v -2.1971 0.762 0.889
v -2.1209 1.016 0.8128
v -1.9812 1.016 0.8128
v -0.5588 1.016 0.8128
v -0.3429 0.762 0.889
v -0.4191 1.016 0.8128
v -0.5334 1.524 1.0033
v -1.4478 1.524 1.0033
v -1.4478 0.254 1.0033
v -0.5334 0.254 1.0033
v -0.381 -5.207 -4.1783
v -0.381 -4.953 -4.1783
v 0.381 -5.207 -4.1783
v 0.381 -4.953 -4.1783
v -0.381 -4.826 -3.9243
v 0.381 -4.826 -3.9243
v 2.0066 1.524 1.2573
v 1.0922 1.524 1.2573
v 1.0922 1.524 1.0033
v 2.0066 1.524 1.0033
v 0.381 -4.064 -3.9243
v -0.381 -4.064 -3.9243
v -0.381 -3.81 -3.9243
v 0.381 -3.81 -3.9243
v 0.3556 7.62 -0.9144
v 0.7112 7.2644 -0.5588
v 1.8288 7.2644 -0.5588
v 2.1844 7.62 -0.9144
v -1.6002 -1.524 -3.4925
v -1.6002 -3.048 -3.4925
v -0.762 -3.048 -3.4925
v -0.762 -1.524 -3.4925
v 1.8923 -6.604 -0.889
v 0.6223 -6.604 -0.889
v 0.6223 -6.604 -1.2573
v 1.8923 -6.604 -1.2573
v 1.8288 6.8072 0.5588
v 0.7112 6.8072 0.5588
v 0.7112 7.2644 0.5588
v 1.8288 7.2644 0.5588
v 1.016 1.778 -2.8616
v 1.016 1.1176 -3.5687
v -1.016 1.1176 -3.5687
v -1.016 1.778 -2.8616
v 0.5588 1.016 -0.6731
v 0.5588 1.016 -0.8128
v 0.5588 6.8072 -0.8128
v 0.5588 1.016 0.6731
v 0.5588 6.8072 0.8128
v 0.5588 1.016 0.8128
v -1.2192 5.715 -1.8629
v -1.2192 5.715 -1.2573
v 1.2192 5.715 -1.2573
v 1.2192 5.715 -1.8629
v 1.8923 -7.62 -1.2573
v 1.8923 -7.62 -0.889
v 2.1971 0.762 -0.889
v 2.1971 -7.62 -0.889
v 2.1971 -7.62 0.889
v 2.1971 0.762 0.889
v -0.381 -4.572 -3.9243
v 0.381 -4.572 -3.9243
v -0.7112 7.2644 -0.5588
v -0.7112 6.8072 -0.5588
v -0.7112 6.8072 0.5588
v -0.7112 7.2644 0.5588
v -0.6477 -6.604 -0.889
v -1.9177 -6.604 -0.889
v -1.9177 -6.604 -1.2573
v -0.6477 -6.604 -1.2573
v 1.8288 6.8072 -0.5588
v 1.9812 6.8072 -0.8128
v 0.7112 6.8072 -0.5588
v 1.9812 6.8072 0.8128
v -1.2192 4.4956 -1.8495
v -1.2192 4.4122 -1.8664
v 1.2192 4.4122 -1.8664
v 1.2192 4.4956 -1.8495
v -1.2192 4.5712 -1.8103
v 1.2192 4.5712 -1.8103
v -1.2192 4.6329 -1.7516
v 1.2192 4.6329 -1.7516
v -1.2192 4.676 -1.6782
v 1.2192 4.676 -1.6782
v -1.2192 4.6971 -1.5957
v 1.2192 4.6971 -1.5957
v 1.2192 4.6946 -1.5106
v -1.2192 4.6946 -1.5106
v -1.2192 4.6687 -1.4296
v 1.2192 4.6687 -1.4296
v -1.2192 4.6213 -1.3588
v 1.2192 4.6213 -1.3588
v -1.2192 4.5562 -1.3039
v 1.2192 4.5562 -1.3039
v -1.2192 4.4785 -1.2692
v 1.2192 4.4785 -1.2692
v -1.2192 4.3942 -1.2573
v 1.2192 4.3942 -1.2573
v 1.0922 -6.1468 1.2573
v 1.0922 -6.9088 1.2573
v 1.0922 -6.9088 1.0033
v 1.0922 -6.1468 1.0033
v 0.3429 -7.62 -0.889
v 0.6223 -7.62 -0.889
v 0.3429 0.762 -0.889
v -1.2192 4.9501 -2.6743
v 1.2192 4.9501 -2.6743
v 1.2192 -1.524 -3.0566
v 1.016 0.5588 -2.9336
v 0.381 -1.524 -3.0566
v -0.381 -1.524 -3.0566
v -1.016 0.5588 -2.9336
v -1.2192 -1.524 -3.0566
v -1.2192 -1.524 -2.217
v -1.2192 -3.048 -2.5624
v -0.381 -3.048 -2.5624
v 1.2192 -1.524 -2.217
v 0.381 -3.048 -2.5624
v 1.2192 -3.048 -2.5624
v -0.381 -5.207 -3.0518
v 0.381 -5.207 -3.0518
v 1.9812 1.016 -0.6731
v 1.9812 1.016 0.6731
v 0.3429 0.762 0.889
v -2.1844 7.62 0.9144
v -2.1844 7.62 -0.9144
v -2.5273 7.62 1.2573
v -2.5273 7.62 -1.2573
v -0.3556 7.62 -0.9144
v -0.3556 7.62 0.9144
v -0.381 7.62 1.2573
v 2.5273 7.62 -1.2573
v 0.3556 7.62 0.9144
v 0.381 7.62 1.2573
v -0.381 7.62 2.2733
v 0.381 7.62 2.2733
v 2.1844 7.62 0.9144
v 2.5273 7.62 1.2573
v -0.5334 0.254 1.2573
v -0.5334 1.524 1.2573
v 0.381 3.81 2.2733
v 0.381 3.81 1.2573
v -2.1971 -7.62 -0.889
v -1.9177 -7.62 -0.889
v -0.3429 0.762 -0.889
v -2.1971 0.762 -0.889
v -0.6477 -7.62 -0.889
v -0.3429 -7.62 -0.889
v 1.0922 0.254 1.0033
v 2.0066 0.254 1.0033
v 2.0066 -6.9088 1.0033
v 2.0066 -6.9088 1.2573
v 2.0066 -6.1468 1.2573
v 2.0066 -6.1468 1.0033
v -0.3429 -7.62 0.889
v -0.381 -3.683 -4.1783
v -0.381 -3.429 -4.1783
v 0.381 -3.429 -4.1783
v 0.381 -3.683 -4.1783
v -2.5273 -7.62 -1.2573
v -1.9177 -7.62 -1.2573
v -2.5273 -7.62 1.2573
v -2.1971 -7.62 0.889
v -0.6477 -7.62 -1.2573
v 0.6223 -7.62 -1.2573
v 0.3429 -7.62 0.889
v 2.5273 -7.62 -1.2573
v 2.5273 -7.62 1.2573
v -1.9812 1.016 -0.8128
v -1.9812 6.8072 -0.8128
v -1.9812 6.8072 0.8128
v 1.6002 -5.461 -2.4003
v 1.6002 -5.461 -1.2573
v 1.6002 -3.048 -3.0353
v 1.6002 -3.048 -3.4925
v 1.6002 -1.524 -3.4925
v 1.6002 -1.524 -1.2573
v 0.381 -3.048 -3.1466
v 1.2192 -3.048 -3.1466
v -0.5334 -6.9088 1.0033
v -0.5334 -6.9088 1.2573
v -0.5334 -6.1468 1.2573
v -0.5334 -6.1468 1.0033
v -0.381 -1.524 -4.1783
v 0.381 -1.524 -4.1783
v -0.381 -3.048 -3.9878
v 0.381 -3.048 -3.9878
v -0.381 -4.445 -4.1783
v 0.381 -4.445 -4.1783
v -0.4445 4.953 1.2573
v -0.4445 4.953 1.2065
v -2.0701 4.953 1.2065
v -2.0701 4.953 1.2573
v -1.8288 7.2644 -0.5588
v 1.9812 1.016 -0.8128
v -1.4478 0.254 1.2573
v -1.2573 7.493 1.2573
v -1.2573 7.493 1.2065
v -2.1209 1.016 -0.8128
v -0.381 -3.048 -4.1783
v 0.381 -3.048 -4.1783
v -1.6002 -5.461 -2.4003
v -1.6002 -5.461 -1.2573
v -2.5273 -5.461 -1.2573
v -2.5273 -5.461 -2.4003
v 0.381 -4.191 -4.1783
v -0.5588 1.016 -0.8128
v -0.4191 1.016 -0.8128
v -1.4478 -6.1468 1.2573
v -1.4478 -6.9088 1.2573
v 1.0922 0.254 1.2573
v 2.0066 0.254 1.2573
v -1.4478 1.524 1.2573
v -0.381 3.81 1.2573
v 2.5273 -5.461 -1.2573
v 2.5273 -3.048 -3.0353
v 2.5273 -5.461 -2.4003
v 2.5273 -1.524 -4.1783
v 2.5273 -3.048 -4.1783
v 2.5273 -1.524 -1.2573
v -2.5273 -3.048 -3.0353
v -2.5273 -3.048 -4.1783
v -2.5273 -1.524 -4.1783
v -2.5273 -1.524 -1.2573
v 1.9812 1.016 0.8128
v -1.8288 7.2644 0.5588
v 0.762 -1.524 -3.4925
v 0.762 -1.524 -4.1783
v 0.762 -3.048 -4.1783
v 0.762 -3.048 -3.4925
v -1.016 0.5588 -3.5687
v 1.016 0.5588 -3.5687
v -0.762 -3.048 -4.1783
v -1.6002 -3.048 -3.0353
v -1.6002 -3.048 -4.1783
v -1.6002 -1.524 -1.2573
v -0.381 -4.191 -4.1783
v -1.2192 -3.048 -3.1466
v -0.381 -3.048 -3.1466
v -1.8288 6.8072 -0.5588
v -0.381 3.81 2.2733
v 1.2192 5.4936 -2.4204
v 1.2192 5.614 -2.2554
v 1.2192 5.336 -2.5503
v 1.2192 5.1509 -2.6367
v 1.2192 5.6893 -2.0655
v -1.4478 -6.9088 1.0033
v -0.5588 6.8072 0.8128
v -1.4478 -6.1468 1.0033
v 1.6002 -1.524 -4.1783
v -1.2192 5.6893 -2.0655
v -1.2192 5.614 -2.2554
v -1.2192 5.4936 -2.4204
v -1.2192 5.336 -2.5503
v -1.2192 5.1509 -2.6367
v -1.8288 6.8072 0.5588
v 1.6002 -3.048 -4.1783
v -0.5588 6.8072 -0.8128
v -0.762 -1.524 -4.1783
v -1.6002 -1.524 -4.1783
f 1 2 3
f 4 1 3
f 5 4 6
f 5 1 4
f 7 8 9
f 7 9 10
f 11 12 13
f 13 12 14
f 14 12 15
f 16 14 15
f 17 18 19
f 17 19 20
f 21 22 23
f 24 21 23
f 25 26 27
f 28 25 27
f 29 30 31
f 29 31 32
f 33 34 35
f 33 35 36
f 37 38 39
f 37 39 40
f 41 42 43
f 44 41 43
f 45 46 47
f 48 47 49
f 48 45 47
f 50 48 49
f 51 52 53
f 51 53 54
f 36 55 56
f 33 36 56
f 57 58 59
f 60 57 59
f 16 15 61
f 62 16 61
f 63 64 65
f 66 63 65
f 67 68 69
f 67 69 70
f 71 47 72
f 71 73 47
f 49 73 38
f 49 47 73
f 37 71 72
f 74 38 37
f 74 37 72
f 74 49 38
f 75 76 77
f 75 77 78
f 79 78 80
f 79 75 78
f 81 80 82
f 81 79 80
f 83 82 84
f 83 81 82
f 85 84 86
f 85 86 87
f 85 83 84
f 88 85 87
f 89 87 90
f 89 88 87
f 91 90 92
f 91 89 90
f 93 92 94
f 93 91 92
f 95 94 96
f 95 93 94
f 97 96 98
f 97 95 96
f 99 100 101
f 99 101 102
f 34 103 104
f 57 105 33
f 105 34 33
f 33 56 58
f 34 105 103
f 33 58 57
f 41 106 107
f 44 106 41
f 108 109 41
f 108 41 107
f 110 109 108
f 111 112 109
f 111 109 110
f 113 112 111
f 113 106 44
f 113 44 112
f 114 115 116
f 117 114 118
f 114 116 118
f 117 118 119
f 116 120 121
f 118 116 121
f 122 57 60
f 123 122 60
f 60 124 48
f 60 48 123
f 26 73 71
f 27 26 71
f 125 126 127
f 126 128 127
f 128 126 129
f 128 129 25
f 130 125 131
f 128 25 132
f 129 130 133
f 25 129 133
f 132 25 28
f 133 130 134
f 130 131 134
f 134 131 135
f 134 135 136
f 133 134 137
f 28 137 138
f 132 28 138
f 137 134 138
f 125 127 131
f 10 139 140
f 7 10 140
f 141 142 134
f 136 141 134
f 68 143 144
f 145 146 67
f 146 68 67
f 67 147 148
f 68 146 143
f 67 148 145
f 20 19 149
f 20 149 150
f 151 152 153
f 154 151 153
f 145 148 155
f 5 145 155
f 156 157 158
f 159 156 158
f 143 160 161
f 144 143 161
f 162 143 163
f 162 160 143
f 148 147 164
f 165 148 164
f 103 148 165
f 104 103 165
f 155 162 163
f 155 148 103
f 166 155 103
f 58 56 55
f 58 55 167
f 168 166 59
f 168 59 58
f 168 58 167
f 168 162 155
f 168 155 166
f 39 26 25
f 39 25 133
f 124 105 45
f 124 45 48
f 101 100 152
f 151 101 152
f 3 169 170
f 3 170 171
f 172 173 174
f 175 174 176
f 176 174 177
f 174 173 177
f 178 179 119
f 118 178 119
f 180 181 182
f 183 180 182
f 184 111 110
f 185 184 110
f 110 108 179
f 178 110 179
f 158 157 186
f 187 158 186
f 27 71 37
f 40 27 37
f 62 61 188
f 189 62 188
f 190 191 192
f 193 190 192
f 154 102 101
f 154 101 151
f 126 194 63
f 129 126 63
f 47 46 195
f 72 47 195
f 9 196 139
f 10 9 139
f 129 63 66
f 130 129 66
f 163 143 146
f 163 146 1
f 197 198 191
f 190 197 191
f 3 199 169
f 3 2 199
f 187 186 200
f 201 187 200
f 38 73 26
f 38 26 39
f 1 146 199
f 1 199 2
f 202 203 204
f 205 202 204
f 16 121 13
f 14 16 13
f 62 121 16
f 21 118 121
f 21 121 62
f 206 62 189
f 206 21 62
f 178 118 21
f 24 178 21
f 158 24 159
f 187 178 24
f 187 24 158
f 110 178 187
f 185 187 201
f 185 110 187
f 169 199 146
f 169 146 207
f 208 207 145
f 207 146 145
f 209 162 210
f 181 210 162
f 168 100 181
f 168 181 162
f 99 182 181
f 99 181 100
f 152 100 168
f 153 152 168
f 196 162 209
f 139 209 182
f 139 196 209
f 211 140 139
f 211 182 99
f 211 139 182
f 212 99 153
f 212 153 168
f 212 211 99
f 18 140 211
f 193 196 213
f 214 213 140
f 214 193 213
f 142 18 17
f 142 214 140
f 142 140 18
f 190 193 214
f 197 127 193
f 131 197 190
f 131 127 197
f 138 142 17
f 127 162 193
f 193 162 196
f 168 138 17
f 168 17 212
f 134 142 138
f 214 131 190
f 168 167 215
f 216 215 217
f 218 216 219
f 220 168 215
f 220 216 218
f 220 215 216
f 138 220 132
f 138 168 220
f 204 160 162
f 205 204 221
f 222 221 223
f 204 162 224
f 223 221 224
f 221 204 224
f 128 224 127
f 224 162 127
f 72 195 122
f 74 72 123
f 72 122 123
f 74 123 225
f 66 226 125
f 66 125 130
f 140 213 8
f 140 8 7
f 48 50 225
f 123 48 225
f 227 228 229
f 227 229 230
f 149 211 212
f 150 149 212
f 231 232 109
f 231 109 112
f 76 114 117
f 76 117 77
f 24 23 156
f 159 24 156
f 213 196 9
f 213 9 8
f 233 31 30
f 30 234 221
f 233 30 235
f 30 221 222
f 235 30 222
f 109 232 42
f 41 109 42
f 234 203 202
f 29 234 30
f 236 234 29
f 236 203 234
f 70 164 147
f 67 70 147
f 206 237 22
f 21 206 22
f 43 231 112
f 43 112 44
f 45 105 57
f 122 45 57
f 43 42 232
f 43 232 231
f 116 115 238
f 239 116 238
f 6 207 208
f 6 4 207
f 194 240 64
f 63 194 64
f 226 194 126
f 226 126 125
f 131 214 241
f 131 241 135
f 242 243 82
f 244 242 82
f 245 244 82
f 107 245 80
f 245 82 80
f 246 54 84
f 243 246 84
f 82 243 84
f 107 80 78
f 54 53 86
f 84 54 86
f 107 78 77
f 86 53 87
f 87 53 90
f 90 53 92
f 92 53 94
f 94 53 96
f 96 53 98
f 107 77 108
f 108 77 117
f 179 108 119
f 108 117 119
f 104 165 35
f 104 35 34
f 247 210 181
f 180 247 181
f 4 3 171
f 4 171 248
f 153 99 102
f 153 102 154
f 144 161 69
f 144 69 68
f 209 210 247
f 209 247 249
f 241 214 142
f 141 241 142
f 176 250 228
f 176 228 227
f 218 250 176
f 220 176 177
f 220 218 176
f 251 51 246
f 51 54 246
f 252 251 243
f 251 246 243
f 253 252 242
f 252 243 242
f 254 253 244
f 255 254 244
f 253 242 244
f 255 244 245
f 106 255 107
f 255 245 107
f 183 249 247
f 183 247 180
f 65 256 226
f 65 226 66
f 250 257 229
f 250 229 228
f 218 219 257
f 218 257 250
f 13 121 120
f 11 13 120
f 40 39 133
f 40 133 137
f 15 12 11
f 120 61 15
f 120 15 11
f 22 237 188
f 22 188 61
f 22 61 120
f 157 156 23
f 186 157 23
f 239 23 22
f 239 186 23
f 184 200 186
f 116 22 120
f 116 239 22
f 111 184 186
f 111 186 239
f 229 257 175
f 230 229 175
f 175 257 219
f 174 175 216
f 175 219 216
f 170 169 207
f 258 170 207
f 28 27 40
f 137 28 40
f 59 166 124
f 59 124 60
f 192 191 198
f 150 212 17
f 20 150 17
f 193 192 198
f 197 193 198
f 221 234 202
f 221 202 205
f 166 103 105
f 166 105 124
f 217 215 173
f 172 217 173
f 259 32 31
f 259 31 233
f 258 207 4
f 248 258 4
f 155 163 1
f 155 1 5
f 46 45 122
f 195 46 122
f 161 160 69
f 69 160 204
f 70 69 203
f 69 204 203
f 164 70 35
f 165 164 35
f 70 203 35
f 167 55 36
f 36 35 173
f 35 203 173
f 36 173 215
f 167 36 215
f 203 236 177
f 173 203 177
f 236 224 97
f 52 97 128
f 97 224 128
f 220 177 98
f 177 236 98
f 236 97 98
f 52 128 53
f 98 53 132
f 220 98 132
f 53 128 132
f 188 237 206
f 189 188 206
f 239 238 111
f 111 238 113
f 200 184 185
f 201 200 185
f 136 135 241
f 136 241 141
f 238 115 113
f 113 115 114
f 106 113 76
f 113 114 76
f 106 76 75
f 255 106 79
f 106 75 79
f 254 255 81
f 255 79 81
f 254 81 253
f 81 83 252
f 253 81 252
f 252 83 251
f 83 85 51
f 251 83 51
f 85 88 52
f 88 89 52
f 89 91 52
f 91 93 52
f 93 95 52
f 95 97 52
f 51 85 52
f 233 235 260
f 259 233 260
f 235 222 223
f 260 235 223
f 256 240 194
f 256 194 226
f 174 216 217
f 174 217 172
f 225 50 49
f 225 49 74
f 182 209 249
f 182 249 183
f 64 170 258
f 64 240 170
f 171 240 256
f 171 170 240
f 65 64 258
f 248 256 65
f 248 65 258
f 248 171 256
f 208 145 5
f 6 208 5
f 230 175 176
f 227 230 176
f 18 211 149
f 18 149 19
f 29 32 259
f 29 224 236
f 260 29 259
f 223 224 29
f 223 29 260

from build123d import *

# Parameters (mm, degrees)
SKETCH1_W            = 5.0546
SKETCH1_H            = 15.24
BOSS_EXTRUDE1_DEPTH  = 2.514600001
CUT_EXTRUDE1_REACH   = 2.051
BOSS_EXTRUDE2_DEPTH  = 2.4384
CHAMFER1_SIZE        = 3.689417857
CHAMFER1_SIZE2       = 0.617363155
BOSS_EXTRUDE3_DEPTH  = 1.121675474
DRAFT1_ANGLE         = 3.38
FILLET1_R            = 0.8128
CUT_EXTRUDE2_DEPTH   = 0.8382
CUT_EXTRUDE3_DEPTH   = 0.8382
BOSS_EXTRUDE4_REACH  = 6.826
SKETCH7_W            = 2.032
SKETCH7_H            = 0.5588
DRAFT2_ANGLE         = 43.044366599
SKETCH8_W            = 0.9271
SKETCH8_H            = 3.937
BOSS_EXTRUDE5_DEPTH  = 1.778
SKETCH9_W            = 0.9271
SKETCH9_H            = 3.937
BOSS_EXTRUDE6_DEPTH  = 1.778
SKETCH10_W           = 0.9271
SKETCH10_H           = 1.524
BOSS_EXTRUDE7_DEPTH  = 1.143
SKETCH11_W           = 0.9271
SKETCH11_H           = 1.524
BOSS_EXTRUDE8_DEPTH  = 1.143
SKETCH12_W           = 0.6858
SKETCH12_H           = 1.524
BOSS_EXTRUDE9_DEPTH  = 0.8382
SKETCH13_W           = 0.6858
SKETCH13_H           = 1.524
BOSS_EXTRUDE10_DEPTH = 0.8382
DRAFT3_ANGLE         = 14.743562836
DRAFT4_ANGLE         = 14.743562836
CUT_EXTRUDE4_DEPTH   = 0.762
CUT_EXTRUDE5_DEPTH   = 0.762
CUT_EXTRUDE6_DEPTH   = 0.762
SKETCH17_W           = 0.762
SKETCH17_H           = 3.81
BOSS_EXTRUDE11_DEPTH = 1.016
SKETCH18_W           = 0.9144
SKETCH18_H           = 1.27
CUT_EXTRUDE7_DEPTH   = 0.254
SKETCH19_W           = 0.9144
SKETCH19_H           = 0.762
CUT_EXTRUDE8_DEPTH   = 0.254
SKETCH20_W           = 0.9144
SKETCH20_H           = 1.27
CUT_EXTRUDE9_DEPTH   = 0.254
SKETCH21_W           = 0.9144
SKETCH21_H           = 0.762
CUT_EXTRUDE10_DEPTH  = 0.254
SKETCH22_W           = 1.8542
SKETCH22_H           = 1.778
CUT_EXTRUDE11_DEPTH  = 8.636
SKETCH23_W           = 1.8542
SKETCH23_H           = 1.778
CUT_EXTRUDE12_DEPTH  = 8.636
CHAMFER2_SIZE        = 0.0762
CHAMFER2_SIZE2       = 0.254
CHAMFER3_SIZE        = 0.2159
CHAMFER3_SIZE2       = 0.254
SKETCH24_W           = 1.27
SKETCH24_H           = 0.3683
CUT_EXTRUDE13_DEPTH  = 1.016
SKETCH25_W           = 1.27
SKETCH25_H           = 0.3683
CUT_EXTRUDE14_DEPTH  = 1.016
SKETCH26_W           = 1.4224
SKETCH26_H           = 1.6256
CUT_EXTRUDE15_DEPTH  = 5.7912
SKETCH27_W           = 1.4224
SKETCH27_H           = 1.6256
CUT_EXTRUDE16_DEPTH  = 5.7912
SKETCH28_W           = 1.1176
SKETCH28_H           = 1.1176
CUT_EXTRUDE17_DEPTH  = 1.8128
SKETCH29_W           = 1.1176
SKETCH29_H           = 1.1176
CUT_EXTRUDE18_DEPTH  = 1.8128
CHAMFER4_SIZE        = 0.3556
CHAMFER5_SIZE        = 0.3556


with BuildPart() as part:
    # Sketch1 → Boss-Extrude1 (new body)
    with BuildSketch(Plane.XY.offset(1.2573)):
        Rectangle(SKETCH1_W, SKETCH1_H)
    extrude(amount=-BOSS_EXTRUDE1_DEPTH)

    # Sketch2 → Cut-Extrude1 (cut, up to next)
    with BuildSketch(Plane(origin=(0, 0, 1.2065), x_dir=(-1, 0, 0), z_dir=(0, 0, -1)), mode=Mode.PRIVATE) as cut_extrude1_sk1:
        Polygon((0.4445, 4.953), (2.0701, 4.953), (1.2573, 7.493), align=None)
    cut_extrude1_tool1 = extrude(cut_extrude1_sk1.sketch, amount=-CUT_EXTRUDE1_REACH, mode=Mode.PRIVATE) & part.part
    add(cut_extrude1_tool1.solids().sort_by_distance((-1.2573, 5.799667, 1.2065))[0], mode=Mode.SUBTRACT)

    # Sketch3 → Boss-Extrude2 (add)
    with BuildSketch(Plane(origin=(-1.2192, 0, 0), x_dir=(0, -1, 0), z_dir=(-1, 0, 0))):
        with BuildLine():
            Line((5.207, -2.434484307), (-4.412170374, -1.866369791))
            ThreePointArc((-4.412170374, -1.866369791), (-4.698867419, -1.553110903), (-4.394200001, -1.2573))
            Line((-4.394200001, -1.2573), (-5.715, -1.2573))
            Line((-5.715, -1.2573), (-5.715, -3.056624526))
            Line((-5.715, -3.056624526), (3.048, -3.056624526))
            Line((3.048, -3.056624526), (3.429, -3.056624526))
            Line((3.429, -3.056624526), (3.683, -3.056624526))
            Line((3.683, -3.056624526), (4.191, -3.056624526))
            Line((4.191, -3.056624526), (4.445, -3.056624526))
            Line((4.445, -3.056624526), (4.953, -3.056624526))
            Line((4.953, -3.056624526), (5.207, -3.056624526))
            Line((5.207, -3.056624526), (5.207, -2.434484307))
        make_face()
    extrude(amount=-BOSS_EXTRUDE2_DEPTH)

    # Chamfer1
    chamfer1_edges = [part.edges().sort_by_distance(p)[0] for p in [
        (0, -5.207, -2.434484307),
    ]]
    chamfer1_side = [part.faces().sort_by_distance(p)[0] for p in [
        (0, -0.397414813, -2.150427049),
    ]]
    chamfer(chamfer1_edges, length=CHAMFER1_SIZE, length2=CHAMFER1_SIZE2, reference=chamfer1_side[0])

    # Sketch4 → Boss-Extrude3 (add)
    with BuildSketch(Plane(origin=(0, 0, -3.056624526), x_dir=(-1, 0, 0), z_dir=(0, 0, -1))):
        Polygon((1.2192, -3.683000003), (1.2192, -4.191000003), (1.2192, -4.445000003), (1.2192, -4.953000003), (1.2192, -5.207000003), (0.381, -5.207000003), (-0.381, -5.207000003), (-1.2192, -5.207000003), (-1.2192, -4.953000003), (-1.2192, -4.445000003), (-1.2192, -4.191000003), (-1.2192, -3.683000003), (-1.2192, -3.429000003), (-1.2192, -3.048000003), (-1.2192, -1.524000003), (-0.381, -1.524000003), (0.381, -1.524000003), (1.2192, -1.524000003), (1.2192, -3.048000003), (1.2192, -3.429000003), align=None)
    extrude(amount=BOSS_EXTRUDE3_DEPTH)

    # Draft1
    draft1_faces = [part.faces().sort_by_distance(p)[0] for p in [
        (0, 2.095499999, -3.056624526),
    ]]
    draft(draft1_faces, Plane(origin=(1.2192, -1.524000003, -4.1783), x_dir=(1, 0, 0), z_dir=(0, 1, 0)), DRAFT1_ANGLE)

    # Fillet1
    fillet1_edges = [part.edges().sort_by_distance(p)[0] for p in [
        (0, 5.715, -2.629084434),
    ]]
    fillet(fillet1_edges, radius=FILLET1_R)

    # Sketch5 → Cut-Extrude2 (cut)
    with BuildSketch(Plane.ZY.offset(1.2192)):
        Polygon((-4.1783, -1.523999999), (-4.1783, -3.048), (-4.1783, -3.429), (-4.1783, -3.683), (-4.1783, -4.191), (-4.1783, -4.445), (-4.1783, -4.953), (-4.1783, -5.207), (-3.051847462, -5.207), (-2.562432966, -3.048), (-3.146632966, -3.048), (-3.056624525, -1.523999999), align=None)
    extrude(amount=-CUT_EXTRUDE2_DEPTH, mode=Mode.SUBTRACT)

    # Sketch6 → Cut-Extrude3 (cut)
    with BuildSketch(Plane(origin=(1.2192, 0, 0), x_dir=(0, 0, -1), z_dir=(1, 0, 0))):
        Polygon((4.1783, -3.429), (4.1783, -3.048), (4.1783, -1.524000001), (3.056624525, -1.524000001), (3.146632966, -3.048), (2.562432966, -3.048), (3.051847462, -5.207), (4.1783, -5.207), (4.1783, -4.953), (4.1783, -4.445), (4.1783, -4.191), (4.1783, -3.683), align=None)
    extrude(amount=-CUT_EXTRUDE3_DEPTH, mode=Mode.SUBTRACT)

    # Sketch7 → Boss-Extrude4 (add, up to next)
    with BuildSketch(Plane(origin=(0, 0, -3.5687), x_dir=(-1, 0, 0), z_dir=(0, 0, -1)), mode=Mode.PRIVATE) as boss_extrude4_sk1:
        with Locations((0, 0.8382)):
            Rectangle(SKETCH7_W, SKETCH7_H)
    boss_extrude4_tool1 = extrude(boss_extrude4_sk1.sketch, amount=-BOSS_EXTRUDE4_REACH, mode=Mode.PRIVATE) - part.part
    add(boss_extrude4_tool1.solids().sort_by_distance((0, 0.8382, -3.5687))[0])

    # Draft2
    draft2_faces = [part.faces().sort_by_distance(p)[0] for p in [
        (0, 1.1176, -3.234654948),
    ]]
    draft(draft2_faces, Plane(origin=(0, 0, -3.5687), x_dir=(-1, 0, 0), z_dir=(0, 0, -1)), DRAFT2_ANGLE)

    # Sketch8 → Boss-Extrude5 (add)
    with BuildSketch(Plane(origin=(0, 0, -1.257300001), x_dir=(-1, 0, 0), z_dir=(0, 0, -1))):
        with Locations((-2.06375, -3.4925)):
            Rectangle(SKETCH8_W, SKETCH8_H)
    extrude(amount=BOSS_EXTRUDE5_DEPTH)

    # Sketch9 → Boss-Extrude6 (add)
    with BuildSketch(Plane(origin=(0, 0, -1.257300001), x_dir=(-1, 0, 0), z_dir=(0, 0, -1))):
        with Locations((2.06375, -3.4925)):
            Rectangle(SKETCH9_W, SKETCH9_H)
    extrude(amount=BOSS_EXTRUDE6_DEPTH)

    # Sketch10 → Boss-Extrude7 (add)
    with BuildSketch(Plane(origin=(0, 0, -3.035300001), x_dir=(-1, 0, 0), z_dir=(0, 0, -1))):
        with Locations((2.06375, -2.286)):
            Rectangle(SKETCH10_W, SKETCH10_H)
    extrude(amount=BOSS_EXTRUDE7_DEPTH)

    # Sketch11 → Boss-Extrude8 (add)
    with BuildSketch(Plane(origin=(0, 0, -3.035300001), x_dir=(-1, 0, 0), z_dir=(0, 0, -1))):
        with Locations((-2.06375, -2.286)):
            Rectangle(SKETCH11_W, SKETCH11_H)
    extrude(amount=BOSS_EXTRUDE8_DEPTH)

    # Sketch12 → Boss-Extrude9 (add)
    with BuildSketch(Plane.ZY.offset(-1.6002)):
        with Locations((-3.8354, -2.286)):
            Rectangle(SKETCH12_W, SKETCH12_H)
    extrude(amount=BOSS_EXTRUDE9_DEPTH)

    # Sketch13 → Boss-Extrude10 (add)
    with BuildSketch(Plane(origin=(-1.6002, 0, 0), x_dir=(0, 0, -1), z_dir=(1, 0, 0))):
        with Locations((3.8354, -2.286)):
            Rectangle(SKETCH13_W, SKETCH13_H)
    extrude(amount=BOSS_EXTRUDE10_DEPTH)

    # Draft3
    draft3_faces = [part.faces().sort_by_distance(p)[0] for p in [
        (-2.06375, -4.2545, -3.035300001),
    ]]
    draft(draft3_faces, Plane(origin=(-2.5273, -3.048, -4.178300001), x_dir=(-1, 0, 0), z_dir=(0, -1, 0)), DRAFT3_ANGLE)

    # Draft4
    draft4_faces = [part.faces().sort_by_distance(p)[0] for p in [
        (2.06375, -4.2545, -3.035300001),
    ]]
    draft(draft4_faces, Plane(origin=(1.6002, -3.048, -4.178300001), x_dir=(0, 0, -1), z_dir=(0, -1, 0)), DRAFT4_ANGLE)

    # Sketch14 → Cut-Extrude4 (cut)
    with BuildSketch(Plane.ZY.offset(0.381)):
        Polygon((-4.1783, -3.429), (-3.9878, -3.048), (-4.1783, -3.048), align=None)
    extrude(amount=-CUT_EXTRUDE4_DEPTH, mode=Mode.SUBTRACT)

    # Sketch15 → Cut-Extrude5 (cut)
    with BuildSketch(Plane.ZY.offset(0.381)):
        Polygon((-4.1783, -4.191), (-3.9243, -4.064), (-3.9243, -3.81), (-4.1783, -3.683), align=None)
    extrude(amount=-CUT_EXTRUDE5_DEPTH, mode=Mode.SUBTRACT)

    # Sketch16 → Cut-Extrude6 (cut)
    with BuildSketch(Plane.ZY.offset(0.381)):
        Polygon((-4.1783, -4.953), (-3.9243, -4.826), (-3.9243, -4.572), (-4.1783, -4.445), align=None)
    extrude(amount=-CUT_EXTRUDE6_DEPTH, mode=Mode.SUBTRACT)

    # Sketch17 → Boss-Extrude11 (add)
    with BuildSketch(Plane.XY.offset(1.2573)):
        with Locations((0, 5.715)):
            Rectangle(SKETCH17_W, SKETCH17_H)
    extrude(amount=BOSS_EXTRUDE11_DEPTH)

    # Sketch18 → Cut-Extrude7 (cut)
    with BuildSketch(Plane.XY.offset(1.2573)):
        with Locations((1.5494, 0.889)):
            Rectangle(SKETCH18_W, SKETCH18_H)
    extrude(amount=-CUT_EXTRUDE7_DEPTH, mode=Mode.SUBTRACT)

    # Sketch19 → Cut-Extrude8 (cut)
    with BuildSketch(Plane.XY.offset(1.2573)):
        with Locations((1.5494, -6.5278)):
            Rectangle(SKETCH19_W, SKETCH19_H)
    extrude(amount=-CUT_EXTRUDE8_DEPTH, mode=Mode.SUBTRACT)

    # Sketch20 → Cut-Extrude9 (cut)
    with BuildSketch(Plane.XY.offset(1.2573)):
        with Locations((-0.9906, 0.889)):
            Rectangle(SKETCH20_W, SKETCH20_H)
    extrude(amount=-CUT_EXTRUDE9_DEPTH, mode=Mode.SUBTRACT)

    # Sketch21 → Cut-Extrude10 (cut)
    with BuildSketch(Plane.XY.offset(1.2573)):
        with Locations((-0.9906, -6.5278)):
            Rectangle(SKETCH21_W, SKETCH21_H)
    extrude(amount=-CUT_EXTRUDE10_DEPTH, mode=Mode.SUBTRACT)

    # Sketch22 → Cut-Extrude11 (cut)
    with BuildSketch(Plane.XZ.offset(7.62)):
        with Locations((-1.27, 0)):
            Rectangle(SKETCH22_W, SKETCH22_H)
    extrude(amount=-CUT_EXTRUDE11_DEPTH, mode=Mode.SUBTRACT)

    # Sketch23 → Cut-Extrude12 (cut)
    with BuildSketch(Plane.XZ.offset(7.62)):
        with Locations((1.27, 0)):
            Rectangle(SKETCH23_W, SKETCH23_H)
    extrude(amount=-CUT_EXTRUDE12_DEPTH, mode=Mode.SUBTRACT)

    # Chamfer2
    chamfer2_edges = [part.edges().sort_by_distance(p)[0] for p in [
        (-0.3429, 1.016, 0),
        (-1.27, 1.016, -0.889),
        (-2.1971, 1.016, 0),
        (-1.27, 1.016, 0.889),
    ]]
    chamfer2_side = [part.faces().sort_by_distance(p)[0] for p in [
        (-1.27, 1.016, 0),
    ]]
    chamfer(chamfer2_edges, length=CHAMFER2_SIZE, length2=CHAMFER2_SIZE2, reference=chamfer2_side[0])

    # Chamfer3
    chamfer3_edges = [part.edges().sort_by_distance(p)[0] for p in [
        (1.27, 1.016, 0.889),
        (2.1971, 1.016, 0),
        (1.27, 1.016, -0.889),
        (0.3429, 1.016, 0),
    ]]
    chamfer3_side = [part.faces().sort_by_distance(p)[0] for p in [
        (1.27, 1.016, 0),
    ]]
    chamfer(chamfer3_edges, length=CHAMFER3_SIZE, length2=CHAMFER3_SIZE2, reference=chamfer3_side[0])

    # Sketch24 → Cut-Extrude13 (cut)
    with BuildSketch(Plane.XZ.offset(7.62)):
        with Locations((-1.2827, -1.07315)):
            Rectangle(SKETCH24_W, SKETCH24_H)
    extrude(amount=-CUT_EXTRUDE13_DEPTH, mode=Mode.SUBTRACT)

    # Sketch25 → Cut-Extrude14 (cut)
    with BuildSketch(Plane.XZ.offset(7.62)):
        with Locations((1.2573, -1.07315)):
            Rectangle(SKETCH25_W, SKETCH25_H)
    extrude(amount=-CUT_EXTRUDE14_DEPTH, mode=Mode.SUBTRACT)

    # Sketch26 → Cut-Extrude15 (cut)
    with BuildSketch(Plane.XZ.offset(-1.016)):
        with Locations((-1.27, 0)):
            Rectangle(SKETCH26_W, SKETCH26_H)
    extrude(amount=-CUT_EXTRUDE15_DEPTH, mode=Mode.SUBTRACT)

    # Sketch27 → Cut-Extrude16 (cut)
    with BuildSketch(Plane.XZ.offset(-1.016)):
        with Locations((1.27, 0)):
            Rectangle(SKETCH27_W, SKETCH27_H)
    extrude(amount=-CUT_EXTRUDE16_DEPTH, mode=Mode.SUBTRACT)

    # Sketch28 → Cut-Extrude17 (cut, through all)
    with BuildSketch(Plane.XZ.offset(-6.8072)):
        with Locations((1.27, 0)):
            Rectangle(SKETCH28_W, SKETCH28_H)
    extrude(amount=-CUT_EXTRUDE17_DEPTH, mode=Mode.SUBTRACT)

    # Sketch29 → Cut-Extrude18 (cut, through all)
    with BuildSketch(Plane.XZ.offset(-6.8072)):
        with Locations((-1.27, 0)):
            Rectangle(SKETCH29_W, SKETCH29_H)
    extrude(amount=-CUT_EXTRUDE18_DEPTH, mode=Mode.SUBTRACT)

    # Chamfer4
    chamfer4_edges = [part.edges().sort_by_distance(p)[0] for p in [
        (1.27, 7.62, -0.5588),
        (0.7112, 7.62, 0),
        (1.27, 7.62, 0.5588),
        (1.8288, 7.62, 0),
    ]]
    chamfer(chamfer4_edges, length=CHAMFER4_SIZE)

    # Chamfer5
    chamfer5_edges = [part.edges().sort_by_distance(p)[0] for p in [
        (-0.7112, 7.62, 0),
        (-1.27, 7.62, -0.5588),
        (-1.8288, 7.62, 0),
        (-1.27, 7.62, 0.5588),
    ]]
    chamfer(chamfer5_edges, length=CHAMFER5_SIZE)


solid = part.part
